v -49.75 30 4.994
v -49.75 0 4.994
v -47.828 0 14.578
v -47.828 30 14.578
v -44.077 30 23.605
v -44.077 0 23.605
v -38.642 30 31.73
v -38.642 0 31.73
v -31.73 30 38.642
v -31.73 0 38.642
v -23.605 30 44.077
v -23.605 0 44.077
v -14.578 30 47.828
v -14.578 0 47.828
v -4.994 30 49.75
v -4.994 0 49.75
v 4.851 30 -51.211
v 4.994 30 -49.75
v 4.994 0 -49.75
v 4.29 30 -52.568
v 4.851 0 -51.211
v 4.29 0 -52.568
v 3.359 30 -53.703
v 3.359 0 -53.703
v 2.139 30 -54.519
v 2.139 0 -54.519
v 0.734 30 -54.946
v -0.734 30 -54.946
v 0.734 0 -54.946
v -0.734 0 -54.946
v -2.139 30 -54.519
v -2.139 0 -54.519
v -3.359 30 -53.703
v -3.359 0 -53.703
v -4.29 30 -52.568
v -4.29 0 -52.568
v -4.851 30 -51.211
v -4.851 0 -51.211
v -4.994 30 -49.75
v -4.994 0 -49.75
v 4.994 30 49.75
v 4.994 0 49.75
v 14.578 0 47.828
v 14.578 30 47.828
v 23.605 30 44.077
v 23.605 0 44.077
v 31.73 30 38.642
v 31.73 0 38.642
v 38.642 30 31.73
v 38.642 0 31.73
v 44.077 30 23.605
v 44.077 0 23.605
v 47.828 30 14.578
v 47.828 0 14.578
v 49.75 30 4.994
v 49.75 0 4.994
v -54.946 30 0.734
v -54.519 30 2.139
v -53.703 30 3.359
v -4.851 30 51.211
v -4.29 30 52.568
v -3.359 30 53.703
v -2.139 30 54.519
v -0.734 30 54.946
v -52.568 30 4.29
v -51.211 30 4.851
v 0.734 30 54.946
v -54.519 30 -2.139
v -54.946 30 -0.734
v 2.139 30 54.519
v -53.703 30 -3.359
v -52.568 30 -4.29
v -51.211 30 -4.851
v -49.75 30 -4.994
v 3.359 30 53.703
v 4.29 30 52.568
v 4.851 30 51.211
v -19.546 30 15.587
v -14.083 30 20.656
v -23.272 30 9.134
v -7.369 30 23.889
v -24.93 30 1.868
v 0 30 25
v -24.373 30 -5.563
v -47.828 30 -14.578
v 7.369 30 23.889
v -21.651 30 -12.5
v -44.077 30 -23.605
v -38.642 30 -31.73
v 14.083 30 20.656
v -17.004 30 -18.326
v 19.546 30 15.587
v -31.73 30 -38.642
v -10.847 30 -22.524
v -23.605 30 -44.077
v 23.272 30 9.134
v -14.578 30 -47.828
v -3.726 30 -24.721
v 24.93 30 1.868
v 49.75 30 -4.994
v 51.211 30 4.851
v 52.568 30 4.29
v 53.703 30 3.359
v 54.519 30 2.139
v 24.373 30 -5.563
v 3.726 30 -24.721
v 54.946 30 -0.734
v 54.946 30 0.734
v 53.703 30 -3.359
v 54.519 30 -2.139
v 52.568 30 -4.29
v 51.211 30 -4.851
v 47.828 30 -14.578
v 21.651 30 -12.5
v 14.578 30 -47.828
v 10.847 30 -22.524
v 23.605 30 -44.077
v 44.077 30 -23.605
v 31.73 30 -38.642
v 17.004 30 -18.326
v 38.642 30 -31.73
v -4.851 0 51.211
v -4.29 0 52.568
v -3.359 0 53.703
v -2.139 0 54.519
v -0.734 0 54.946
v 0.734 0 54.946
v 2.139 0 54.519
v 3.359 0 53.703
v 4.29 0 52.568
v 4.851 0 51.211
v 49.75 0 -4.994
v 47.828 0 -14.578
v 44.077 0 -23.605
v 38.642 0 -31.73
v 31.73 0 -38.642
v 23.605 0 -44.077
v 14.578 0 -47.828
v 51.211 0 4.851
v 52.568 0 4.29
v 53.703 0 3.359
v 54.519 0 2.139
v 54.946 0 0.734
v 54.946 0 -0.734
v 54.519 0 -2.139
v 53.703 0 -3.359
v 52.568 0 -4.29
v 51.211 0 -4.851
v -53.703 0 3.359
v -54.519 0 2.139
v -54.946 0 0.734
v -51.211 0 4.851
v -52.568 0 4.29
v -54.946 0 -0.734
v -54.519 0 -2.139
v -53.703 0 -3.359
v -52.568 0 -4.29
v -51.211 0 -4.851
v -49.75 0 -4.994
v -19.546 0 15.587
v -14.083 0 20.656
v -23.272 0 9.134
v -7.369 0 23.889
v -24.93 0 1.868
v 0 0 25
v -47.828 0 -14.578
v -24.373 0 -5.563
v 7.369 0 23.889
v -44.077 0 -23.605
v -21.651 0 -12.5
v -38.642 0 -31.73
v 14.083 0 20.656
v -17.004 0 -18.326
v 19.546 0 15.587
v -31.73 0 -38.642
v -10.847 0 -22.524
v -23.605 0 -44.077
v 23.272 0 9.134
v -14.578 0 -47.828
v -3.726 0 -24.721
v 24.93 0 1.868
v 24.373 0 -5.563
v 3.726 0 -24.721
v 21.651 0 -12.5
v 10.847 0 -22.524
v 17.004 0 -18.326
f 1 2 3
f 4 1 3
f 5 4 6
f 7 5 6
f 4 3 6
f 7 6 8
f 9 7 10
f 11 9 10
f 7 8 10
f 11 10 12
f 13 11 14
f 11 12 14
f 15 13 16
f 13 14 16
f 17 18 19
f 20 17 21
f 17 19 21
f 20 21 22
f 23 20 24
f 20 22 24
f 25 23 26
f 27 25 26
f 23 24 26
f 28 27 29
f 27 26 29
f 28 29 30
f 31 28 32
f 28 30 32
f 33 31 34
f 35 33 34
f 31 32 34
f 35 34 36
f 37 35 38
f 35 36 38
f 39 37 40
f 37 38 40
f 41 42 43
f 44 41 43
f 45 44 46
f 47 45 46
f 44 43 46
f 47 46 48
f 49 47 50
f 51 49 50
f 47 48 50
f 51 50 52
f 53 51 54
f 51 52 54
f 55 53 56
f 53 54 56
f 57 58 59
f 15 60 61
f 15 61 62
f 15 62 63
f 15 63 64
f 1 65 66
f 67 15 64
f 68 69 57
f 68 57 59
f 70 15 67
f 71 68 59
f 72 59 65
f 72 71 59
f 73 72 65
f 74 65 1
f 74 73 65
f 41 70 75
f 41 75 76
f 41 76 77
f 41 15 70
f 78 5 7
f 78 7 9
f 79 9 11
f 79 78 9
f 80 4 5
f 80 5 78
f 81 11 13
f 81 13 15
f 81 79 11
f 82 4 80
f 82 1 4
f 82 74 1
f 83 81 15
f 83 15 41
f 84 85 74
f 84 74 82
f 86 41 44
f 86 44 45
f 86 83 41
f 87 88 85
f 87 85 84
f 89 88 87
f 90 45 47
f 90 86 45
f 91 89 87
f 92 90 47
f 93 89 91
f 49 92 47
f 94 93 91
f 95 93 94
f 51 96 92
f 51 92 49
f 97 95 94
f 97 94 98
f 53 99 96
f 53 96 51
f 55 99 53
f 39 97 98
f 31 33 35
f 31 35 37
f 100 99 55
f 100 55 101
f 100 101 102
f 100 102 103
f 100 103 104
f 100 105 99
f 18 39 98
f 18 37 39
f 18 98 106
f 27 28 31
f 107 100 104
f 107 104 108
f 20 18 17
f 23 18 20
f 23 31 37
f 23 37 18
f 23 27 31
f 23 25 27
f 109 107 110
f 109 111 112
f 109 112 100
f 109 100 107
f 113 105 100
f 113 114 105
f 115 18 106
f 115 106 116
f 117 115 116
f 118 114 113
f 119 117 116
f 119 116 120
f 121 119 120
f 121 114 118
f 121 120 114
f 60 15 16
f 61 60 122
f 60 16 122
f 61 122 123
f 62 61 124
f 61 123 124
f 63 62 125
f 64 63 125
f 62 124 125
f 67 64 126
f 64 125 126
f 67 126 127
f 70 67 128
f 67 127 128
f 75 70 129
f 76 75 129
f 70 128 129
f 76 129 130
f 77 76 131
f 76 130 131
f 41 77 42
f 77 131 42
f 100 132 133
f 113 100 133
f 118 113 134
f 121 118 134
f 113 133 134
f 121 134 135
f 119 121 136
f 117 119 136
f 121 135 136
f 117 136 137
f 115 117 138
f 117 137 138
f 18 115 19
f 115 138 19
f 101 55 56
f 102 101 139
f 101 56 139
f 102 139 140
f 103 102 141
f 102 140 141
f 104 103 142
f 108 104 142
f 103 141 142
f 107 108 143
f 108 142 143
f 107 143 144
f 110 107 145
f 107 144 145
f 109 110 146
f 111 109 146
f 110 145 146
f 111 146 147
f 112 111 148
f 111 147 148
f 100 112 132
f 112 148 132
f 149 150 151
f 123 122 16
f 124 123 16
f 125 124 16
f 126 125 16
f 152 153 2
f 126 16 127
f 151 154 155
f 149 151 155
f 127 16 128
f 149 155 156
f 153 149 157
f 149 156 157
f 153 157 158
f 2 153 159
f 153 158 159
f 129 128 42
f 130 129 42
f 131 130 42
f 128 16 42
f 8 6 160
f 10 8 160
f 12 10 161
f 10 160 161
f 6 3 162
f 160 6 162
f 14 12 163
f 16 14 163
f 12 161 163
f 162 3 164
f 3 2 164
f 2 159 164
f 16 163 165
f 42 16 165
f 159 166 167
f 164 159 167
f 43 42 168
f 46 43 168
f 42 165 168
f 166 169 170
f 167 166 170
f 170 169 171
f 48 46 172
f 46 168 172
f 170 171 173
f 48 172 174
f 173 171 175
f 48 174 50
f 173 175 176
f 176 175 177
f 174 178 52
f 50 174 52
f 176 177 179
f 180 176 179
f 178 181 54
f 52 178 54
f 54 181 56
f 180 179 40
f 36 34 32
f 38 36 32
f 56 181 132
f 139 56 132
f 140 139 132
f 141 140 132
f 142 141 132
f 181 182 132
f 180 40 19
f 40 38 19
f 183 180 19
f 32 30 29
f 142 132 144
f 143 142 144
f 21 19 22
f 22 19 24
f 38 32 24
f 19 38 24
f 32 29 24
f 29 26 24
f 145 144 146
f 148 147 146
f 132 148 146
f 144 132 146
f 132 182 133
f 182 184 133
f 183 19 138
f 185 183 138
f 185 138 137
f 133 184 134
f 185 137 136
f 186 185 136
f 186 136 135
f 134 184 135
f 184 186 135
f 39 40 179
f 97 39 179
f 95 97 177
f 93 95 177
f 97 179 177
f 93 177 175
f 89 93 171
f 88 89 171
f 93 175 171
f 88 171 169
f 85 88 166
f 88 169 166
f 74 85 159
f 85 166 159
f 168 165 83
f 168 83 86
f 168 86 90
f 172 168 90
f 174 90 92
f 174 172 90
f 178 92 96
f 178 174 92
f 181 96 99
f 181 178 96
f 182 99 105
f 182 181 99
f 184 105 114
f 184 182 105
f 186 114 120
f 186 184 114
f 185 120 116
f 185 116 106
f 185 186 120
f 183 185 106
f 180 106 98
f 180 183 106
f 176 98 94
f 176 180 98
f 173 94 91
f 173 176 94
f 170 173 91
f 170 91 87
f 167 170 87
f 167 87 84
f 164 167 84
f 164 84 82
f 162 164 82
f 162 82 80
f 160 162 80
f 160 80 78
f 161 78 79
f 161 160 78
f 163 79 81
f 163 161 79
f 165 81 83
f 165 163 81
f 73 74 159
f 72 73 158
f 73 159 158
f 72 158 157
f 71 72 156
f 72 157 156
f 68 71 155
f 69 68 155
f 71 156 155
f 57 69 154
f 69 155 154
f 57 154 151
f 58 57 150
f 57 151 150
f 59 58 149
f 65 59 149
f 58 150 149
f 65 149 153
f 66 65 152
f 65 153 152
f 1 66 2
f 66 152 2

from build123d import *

# Parameters (mm, degrees)
CROQUIS1_R              = 25
SALIENTE_EXTRUIR1_DEPTH = 30


with BuildPart() as part:
    # Croquis1 → Saliente-Extruir1 (new body)
    with BuildSketch(Plane(origin=(0, 0, 0), x_dir=(1, 0, 0), z_dir=(0, 1, 0))):
        with BuildLine():
            ThreePointArc((-4.993746089, 49.75), (-35.355339059, 35.355339059), (-49.75, 4.993746089))
            ThreePointArc((-49.75, 4.993746089), (-55, 0), (-49.75, -4.993746089))
            ThreePointArc((-49.75, -4.993746089), (-35.355339059, -35.355339059), (-4.993746089, -49.75))
            ThreePointArc((-4.993746089, -49.75), (0, -55), (4.993746089, -49.75))
            ThreePointArc((4.993746089, -49.75), (35.355339059, -35.355339059), (49.75, -4.993746089))
            ThreePointArc((49.75, -4.993746089), (55, 0), (49.75, 4.993746089))
            ThreePointArc((49.75, 4.993746089), (35.355339059, 35.355339059), (4.993746089, 49.75))
            ThreePointArc((4.993746089, 49.75), (0, 55), (-4.993746089, 49.75))
        make_face()
        with Locations(Location((0, 0, 0), (0, 0, 270))):  # turned: the seam where the file's is
            Circle(CROQUIS1_R, mode=Mode.SUBTRACT)
    extrude(amount=SALIENTE_EXTRUIR1_DEPTH)


solid = part.part
